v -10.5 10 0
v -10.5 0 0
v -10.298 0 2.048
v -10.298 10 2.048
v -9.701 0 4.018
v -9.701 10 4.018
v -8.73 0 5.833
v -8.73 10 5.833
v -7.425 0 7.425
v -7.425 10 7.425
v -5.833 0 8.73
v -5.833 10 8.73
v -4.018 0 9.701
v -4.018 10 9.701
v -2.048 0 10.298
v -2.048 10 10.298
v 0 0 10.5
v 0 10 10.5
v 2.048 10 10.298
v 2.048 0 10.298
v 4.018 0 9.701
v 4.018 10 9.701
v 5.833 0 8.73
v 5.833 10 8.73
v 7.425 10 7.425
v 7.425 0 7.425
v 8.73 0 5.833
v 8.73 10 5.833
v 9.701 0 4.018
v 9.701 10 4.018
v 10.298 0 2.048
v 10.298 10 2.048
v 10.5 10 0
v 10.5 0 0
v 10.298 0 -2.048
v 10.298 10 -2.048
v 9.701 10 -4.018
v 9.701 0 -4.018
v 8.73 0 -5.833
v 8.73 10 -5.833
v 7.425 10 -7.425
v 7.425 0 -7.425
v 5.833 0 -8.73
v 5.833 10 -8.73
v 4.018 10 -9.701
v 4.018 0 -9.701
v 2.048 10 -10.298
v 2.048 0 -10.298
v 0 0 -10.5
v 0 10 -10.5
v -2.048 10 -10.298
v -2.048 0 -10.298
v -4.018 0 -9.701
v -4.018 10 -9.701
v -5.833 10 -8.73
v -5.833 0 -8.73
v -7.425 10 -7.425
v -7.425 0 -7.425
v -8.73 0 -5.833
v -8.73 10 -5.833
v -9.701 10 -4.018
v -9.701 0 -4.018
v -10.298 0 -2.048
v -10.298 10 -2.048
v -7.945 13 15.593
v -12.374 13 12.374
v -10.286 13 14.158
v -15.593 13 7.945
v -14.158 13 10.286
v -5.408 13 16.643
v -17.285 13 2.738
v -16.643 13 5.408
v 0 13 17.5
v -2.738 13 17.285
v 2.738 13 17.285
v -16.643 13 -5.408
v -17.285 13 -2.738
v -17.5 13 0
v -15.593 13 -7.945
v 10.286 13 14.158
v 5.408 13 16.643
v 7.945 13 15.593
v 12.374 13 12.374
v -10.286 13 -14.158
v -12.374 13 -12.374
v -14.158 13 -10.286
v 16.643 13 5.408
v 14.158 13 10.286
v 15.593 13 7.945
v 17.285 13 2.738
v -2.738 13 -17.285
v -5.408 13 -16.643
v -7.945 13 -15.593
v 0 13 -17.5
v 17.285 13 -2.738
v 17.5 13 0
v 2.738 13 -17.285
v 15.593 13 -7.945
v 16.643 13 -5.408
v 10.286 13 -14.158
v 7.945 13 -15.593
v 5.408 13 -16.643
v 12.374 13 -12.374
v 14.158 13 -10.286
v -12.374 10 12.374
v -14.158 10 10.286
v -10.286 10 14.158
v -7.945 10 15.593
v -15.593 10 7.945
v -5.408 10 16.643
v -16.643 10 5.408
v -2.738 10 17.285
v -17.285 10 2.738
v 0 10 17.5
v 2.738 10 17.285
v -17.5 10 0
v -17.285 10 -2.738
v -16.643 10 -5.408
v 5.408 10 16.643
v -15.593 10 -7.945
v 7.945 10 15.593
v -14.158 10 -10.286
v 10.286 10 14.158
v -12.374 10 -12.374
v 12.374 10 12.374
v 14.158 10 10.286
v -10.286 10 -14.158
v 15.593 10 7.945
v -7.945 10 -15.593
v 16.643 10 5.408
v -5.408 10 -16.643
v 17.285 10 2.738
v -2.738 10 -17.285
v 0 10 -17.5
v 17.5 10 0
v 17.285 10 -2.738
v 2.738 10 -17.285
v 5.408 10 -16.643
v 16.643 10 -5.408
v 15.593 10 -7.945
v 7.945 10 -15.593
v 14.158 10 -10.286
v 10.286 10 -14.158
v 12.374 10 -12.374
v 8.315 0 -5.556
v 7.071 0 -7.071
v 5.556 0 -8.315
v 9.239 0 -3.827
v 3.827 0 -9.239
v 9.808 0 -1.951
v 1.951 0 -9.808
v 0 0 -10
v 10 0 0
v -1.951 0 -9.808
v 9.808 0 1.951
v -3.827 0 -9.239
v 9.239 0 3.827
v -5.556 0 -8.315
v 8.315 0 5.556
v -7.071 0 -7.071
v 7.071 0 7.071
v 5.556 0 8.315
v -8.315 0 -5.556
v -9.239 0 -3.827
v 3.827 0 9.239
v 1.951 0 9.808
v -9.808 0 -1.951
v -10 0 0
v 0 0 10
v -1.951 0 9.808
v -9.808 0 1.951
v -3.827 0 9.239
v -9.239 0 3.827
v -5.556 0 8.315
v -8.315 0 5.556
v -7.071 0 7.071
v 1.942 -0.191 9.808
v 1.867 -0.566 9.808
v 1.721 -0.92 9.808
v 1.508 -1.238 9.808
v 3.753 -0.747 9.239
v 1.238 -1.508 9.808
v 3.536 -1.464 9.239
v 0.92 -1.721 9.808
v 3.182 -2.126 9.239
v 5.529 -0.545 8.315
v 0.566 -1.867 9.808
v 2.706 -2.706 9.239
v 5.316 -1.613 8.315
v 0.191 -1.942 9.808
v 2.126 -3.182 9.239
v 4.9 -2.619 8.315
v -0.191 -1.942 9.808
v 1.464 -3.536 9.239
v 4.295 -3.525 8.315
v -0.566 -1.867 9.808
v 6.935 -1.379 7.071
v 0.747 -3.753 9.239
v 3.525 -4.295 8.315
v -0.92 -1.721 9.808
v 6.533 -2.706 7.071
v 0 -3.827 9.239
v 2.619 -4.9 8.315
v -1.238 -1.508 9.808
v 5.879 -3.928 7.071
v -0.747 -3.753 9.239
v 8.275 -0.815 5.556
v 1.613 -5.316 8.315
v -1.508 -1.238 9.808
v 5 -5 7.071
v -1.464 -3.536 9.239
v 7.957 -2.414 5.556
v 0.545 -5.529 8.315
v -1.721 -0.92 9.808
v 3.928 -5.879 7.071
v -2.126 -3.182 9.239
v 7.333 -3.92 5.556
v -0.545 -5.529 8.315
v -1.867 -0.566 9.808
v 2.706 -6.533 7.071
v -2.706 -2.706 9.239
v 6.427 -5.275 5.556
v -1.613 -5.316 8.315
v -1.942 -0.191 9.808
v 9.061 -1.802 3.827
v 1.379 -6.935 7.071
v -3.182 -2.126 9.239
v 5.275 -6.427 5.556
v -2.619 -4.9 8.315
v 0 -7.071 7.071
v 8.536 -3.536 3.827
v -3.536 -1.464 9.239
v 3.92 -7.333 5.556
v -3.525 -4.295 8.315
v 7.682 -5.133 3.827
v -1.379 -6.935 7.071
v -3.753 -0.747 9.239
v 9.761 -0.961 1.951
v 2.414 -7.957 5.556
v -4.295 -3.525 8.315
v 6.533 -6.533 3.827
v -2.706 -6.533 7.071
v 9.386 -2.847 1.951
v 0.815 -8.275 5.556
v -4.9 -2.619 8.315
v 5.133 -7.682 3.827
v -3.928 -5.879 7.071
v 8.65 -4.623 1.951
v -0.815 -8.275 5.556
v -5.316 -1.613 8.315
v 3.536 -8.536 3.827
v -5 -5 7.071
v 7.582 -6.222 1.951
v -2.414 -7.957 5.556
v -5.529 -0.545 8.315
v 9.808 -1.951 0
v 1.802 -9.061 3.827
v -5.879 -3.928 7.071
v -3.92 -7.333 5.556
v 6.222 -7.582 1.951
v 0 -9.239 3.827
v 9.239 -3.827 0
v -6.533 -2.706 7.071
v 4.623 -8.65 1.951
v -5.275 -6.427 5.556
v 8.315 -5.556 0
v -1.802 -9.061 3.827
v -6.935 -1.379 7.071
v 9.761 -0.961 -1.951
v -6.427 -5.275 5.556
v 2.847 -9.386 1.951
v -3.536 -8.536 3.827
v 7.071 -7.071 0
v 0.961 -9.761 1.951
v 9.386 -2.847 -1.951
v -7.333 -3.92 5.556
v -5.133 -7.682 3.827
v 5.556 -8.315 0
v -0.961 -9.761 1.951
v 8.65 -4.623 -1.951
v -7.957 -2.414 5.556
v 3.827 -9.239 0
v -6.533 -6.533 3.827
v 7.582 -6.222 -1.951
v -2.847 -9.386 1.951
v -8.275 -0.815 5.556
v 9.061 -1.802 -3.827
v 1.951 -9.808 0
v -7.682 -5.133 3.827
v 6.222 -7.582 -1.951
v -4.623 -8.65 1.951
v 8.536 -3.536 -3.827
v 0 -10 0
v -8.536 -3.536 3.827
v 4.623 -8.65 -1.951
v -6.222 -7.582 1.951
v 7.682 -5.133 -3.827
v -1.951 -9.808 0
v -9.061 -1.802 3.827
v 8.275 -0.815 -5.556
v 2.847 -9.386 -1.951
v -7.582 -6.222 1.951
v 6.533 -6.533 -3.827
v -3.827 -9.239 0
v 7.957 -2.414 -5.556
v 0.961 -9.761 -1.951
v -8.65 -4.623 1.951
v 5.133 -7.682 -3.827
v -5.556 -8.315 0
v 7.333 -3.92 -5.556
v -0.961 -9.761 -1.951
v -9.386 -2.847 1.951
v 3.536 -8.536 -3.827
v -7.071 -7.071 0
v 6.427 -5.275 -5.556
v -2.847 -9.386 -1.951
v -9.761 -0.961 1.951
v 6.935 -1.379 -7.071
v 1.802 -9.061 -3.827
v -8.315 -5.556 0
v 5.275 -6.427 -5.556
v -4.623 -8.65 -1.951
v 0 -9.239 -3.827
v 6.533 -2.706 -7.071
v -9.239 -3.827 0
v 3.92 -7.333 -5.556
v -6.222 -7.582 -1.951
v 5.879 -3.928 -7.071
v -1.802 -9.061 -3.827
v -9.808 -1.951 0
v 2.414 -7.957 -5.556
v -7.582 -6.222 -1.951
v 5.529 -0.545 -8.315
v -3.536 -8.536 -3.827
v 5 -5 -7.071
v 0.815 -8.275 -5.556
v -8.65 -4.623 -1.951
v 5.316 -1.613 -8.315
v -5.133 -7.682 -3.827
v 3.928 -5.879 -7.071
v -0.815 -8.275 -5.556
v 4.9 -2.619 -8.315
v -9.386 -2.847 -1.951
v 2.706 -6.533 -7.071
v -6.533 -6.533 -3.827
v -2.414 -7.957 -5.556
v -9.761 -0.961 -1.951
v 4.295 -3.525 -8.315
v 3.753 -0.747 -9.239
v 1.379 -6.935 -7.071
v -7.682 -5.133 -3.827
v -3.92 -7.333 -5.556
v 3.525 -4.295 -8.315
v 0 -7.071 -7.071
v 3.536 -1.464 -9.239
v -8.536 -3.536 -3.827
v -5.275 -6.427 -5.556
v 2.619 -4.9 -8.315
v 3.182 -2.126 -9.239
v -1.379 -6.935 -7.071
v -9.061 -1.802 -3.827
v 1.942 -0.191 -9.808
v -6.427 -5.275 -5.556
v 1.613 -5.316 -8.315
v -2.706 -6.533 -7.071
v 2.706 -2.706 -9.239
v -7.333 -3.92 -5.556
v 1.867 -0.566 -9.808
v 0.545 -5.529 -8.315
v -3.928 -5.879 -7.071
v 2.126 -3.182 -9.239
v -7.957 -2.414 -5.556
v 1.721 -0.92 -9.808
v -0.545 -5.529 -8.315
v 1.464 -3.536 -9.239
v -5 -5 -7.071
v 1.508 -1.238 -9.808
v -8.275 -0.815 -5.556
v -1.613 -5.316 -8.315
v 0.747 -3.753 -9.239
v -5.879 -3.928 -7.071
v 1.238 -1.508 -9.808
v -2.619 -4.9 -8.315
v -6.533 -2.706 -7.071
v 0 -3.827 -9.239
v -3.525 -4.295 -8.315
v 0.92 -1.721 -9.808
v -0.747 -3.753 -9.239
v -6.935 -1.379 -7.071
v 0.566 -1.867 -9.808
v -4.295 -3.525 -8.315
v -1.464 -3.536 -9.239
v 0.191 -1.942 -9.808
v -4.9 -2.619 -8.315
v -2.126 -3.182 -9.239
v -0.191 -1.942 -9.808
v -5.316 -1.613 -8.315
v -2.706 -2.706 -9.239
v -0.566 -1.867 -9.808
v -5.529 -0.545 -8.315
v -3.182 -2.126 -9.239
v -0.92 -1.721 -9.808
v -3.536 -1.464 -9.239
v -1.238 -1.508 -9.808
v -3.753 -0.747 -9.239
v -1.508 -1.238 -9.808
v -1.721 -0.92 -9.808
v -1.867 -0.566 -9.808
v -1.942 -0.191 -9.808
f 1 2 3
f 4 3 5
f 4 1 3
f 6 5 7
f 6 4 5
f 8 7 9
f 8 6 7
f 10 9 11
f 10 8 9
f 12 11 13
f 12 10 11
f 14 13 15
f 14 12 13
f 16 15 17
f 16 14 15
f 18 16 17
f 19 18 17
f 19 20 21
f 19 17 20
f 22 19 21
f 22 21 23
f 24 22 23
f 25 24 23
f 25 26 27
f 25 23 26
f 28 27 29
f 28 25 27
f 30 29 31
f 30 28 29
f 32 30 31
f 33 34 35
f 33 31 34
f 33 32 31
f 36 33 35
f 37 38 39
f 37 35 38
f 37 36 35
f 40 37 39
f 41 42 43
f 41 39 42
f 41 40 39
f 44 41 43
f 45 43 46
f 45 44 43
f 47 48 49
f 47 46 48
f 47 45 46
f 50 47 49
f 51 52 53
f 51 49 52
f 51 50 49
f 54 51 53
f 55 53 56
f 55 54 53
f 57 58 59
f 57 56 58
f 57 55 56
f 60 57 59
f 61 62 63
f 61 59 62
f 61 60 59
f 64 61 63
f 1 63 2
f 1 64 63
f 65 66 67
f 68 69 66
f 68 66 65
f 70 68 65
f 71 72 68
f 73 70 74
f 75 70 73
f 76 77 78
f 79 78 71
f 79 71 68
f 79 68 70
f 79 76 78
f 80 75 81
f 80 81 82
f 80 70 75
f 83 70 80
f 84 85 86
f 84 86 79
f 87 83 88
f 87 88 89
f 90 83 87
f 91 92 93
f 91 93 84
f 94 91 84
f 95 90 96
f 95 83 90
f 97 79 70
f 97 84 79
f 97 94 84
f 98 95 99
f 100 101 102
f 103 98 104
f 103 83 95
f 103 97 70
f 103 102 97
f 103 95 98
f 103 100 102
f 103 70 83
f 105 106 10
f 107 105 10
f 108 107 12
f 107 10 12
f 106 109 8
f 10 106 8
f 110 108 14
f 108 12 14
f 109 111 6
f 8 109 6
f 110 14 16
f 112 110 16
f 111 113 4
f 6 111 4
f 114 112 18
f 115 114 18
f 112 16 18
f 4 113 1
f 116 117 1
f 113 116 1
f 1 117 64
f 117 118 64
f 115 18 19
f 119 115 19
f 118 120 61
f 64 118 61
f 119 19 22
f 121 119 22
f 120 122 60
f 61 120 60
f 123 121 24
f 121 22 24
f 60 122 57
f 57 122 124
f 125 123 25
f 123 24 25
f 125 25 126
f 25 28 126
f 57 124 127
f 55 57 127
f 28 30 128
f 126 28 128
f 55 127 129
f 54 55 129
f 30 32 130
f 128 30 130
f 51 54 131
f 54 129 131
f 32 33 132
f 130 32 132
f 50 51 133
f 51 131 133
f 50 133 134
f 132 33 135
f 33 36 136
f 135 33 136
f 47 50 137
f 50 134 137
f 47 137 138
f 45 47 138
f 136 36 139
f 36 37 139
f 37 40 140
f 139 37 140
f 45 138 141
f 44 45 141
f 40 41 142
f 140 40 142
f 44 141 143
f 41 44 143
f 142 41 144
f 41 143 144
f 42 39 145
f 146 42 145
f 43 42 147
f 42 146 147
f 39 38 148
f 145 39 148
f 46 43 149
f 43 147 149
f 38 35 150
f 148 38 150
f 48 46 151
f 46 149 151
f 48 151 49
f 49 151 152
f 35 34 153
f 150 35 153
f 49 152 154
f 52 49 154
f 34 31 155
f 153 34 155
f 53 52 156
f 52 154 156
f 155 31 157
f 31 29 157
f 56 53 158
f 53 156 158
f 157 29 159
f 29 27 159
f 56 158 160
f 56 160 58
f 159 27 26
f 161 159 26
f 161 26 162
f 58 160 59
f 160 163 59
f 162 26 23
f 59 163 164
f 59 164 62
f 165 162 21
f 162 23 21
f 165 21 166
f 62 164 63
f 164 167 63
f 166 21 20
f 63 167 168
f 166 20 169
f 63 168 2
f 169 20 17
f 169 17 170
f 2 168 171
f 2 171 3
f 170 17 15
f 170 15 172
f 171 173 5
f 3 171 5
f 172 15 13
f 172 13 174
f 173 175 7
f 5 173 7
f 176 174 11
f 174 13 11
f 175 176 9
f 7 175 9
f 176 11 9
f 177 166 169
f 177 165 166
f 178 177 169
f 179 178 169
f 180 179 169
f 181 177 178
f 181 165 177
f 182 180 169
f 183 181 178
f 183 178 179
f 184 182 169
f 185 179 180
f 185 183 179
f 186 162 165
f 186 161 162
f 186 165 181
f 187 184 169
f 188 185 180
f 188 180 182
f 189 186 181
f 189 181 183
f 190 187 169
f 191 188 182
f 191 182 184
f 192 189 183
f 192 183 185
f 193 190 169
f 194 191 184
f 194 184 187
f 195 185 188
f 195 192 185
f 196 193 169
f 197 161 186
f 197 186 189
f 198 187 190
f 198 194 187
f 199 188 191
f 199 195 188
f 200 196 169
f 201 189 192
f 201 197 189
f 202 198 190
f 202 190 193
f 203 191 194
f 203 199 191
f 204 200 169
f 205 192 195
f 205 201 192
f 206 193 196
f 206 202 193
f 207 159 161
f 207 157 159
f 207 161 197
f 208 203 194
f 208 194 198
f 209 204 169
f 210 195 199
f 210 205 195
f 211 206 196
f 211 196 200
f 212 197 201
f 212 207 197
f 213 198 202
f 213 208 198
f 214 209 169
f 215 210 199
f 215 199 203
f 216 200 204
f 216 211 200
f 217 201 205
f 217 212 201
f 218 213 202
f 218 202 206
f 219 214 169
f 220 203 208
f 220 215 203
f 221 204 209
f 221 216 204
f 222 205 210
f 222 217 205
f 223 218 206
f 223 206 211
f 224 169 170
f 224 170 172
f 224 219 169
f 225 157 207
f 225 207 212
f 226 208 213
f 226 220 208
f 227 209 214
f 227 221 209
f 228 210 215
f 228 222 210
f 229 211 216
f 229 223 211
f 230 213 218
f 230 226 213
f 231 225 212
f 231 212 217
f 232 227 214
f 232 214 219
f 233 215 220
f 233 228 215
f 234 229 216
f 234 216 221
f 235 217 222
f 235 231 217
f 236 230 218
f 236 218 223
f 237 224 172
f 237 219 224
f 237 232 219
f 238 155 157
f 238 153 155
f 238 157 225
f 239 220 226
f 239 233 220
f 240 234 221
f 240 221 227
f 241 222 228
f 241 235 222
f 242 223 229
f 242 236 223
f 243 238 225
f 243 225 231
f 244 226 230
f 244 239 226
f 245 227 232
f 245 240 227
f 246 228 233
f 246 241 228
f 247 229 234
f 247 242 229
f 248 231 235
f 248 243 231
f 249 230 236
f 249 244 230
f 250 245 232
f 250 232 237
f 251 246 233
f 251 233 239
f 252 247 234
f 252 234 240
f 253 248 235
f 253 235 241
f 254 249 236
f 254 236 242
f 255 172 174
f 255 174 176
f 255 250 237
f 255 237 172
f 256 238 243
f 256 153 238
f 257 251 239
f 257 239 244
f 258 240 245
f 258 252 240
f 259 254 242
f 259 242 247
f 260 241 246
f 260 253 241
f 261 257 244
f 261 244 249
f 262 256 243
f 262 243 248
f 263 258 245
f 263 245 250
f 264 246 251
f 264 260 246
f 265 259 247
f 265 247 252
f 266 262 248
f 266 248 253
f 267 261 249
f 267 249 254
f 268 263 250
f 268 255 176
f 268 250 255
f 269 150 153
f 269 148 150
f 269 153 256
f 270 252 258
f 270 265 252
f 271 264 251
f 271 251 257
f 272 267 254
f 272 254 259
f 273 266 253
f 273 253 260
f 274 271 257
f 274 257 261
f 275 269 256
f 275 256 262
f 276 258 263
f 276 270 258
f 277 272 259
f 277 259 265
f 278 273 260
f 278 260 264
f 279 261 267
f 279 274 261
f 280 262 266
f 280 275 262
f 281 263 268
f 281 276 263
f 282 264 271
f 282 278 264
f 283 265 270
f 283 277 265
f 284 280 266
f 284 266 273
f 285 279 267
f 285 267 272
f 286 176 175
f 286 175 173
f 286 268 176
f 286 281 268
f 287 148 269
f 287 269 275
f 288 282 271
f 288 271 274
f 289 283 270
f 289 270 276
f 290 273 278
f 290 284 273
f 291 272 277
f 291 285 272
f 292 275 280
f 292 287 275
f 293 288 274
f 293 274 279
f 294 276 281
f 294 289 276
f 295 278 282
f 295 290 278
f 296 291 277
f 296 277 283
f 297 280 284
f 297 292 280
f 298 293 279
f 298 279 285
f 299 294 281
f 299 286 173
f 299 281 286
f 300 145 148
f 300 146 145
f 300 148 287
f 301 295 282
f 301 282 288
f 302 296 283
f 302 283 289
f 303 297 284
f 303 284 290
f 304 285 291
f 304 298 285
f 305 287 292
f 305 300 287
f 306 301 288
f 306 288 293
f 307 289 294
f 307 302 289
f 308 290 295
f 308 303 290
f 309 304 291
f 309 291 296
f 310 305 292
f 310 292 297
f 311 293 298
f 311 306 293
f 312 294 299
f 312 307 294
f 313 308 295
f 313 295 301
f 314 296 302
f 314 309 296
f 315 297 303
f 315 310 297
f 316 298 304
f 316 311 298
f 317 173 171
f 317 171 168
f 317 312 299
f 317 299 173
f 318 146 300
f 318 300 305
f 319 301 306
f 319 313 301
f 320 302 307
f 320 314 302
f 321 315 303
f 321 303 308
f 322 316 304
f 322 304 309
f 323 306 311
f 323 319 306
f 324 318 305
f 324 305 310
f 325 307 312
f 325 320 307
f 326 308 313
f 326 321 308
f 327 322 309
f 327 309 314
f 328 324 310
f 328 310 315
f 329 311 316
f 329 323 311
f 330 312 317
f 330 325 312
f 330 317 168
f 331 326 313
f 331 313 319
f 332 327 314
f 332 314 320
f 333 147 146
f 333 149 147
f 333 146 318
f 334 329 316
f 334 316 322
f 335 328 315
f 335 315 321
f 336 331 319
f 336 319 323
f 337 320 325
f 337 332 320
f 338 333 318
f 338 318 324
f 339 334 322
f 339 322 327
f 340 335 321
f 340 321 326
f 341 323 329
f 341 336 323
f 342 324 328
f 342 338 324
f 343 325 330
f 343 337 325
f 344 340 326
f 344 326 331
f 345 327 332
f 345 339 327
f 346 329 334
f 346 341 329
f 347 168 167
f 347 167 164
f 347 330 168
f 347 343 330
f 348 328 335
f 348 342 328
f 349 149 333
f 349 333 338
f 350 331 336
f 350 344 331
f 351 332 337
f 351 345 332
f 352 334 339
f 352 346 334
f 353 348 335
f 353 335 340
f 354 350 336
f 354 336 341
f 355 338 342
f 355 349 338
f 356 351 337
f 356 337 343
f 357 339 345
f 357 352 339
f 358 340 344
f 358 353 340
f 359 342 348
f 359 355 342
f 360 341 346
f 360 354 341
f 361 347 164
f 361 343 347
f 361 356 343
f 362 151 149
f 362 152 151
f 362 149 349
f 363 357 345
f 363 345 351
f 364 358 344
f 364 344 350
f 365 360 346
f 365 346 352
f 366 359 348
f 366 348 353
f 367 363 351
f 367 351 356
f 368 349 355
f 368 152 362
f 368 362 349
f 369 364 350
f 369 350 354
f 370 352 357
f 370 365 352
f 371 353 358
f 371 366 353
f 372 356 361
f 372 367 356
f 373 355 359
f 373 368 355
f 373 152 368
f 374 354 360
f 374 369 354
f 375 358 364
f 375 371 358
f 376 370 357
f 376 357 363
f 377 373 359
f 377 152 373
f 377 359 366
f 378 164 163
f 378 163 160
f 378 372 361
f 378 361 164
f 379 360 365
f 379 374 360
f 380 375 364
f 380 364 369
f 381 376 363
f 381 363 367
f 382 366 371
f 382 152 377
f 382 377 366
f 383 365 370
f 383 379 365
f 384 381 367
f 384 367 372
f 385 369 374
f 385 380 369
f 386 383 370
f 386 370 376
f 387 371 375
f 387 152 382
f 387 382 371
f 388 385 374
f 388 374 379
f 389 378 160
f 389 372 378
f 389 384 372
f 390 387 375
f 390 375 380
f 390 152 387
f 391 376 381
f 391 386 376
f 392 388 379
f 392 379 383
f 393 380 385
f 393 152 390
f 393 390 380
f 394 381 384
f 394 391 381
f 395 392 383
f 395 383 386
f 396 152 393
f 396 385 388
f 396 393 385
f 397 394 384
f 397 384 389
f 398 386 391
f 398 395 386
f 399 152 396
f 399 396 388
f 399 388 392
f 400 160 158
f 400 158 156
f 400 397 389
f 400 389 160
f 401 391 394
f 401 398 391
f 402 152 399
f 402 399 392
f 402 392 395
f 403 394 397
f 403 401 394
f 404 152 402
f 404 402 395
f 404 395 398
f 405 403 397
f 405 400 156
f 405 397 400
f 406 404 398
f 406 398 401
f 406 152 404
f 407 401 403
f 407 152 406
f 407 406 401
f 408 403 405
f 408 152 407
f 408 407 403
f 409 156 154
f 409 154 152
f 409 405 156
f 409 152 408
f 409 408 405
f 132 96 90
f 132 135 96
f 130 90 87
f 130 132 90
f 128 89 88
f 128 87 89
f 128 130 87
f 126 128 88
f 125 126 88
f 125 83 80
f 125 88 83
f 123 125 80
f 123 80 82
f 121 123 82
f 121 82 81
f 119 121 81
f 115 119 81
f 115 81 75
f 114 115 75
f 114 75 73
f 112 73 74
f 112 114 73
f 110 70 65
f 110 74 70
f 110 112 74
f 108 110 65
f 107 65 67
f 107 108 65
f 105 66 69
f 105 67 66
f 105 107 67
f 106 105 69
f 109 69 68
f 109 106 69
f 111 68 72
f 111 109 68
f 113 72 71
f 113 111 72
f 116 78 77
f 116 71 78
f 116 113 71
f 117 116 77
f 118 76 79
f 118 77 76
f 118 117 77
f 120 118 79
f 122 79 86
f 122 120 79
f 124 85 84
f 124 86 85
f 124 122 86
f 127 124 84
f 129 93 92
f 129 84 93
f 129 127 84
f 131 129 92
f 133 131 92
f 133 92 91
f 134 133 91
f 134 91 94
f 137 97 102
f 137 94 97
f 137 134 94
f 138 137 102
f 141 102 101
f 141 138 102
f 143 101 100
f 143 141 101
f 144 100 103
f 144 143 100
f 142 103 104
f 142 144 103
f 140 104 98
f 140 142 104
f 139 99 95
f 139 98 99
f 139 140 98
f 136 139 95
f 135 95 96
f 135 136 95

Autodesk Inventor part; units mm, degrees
ref_plane "YZ Plane" through (0, 0, 0) normal (1, 0, 0) x (0, 1, 0)
ref_plane "XY Plane" through (0, 0, 0) normal (0, 0, 1) x (1, 0, 0)
sketch "Sketch1" plane through (0, 0, 0) normal (0, 1, 0) x (-1, 0, 0)
  arc A0 (0, 10) -> (0, -10) centre (0, 0) ccw
  line L0 (0, 10) -> (0, -10)
  dimension "d0" = 20
revolve "Revolution1" add sketch "Sketch1" angle 360 about axis through (0, 0, 10) along (0, 0, -1)
ref_plane "Work Plane1" through (0, 10, 0) normal (0, 1, 0) x (-1, 0, 0)
sketch "Sketch2" plane through (0, 10, 0) normal (0, 1, 0) x (-1, 0, 0)
  circle A0 centre (0, 0) radius 10.5
  dimension "d2" = 21
sketch "Sketch3" plane through (0, 0, 0) normal (0, 1, 0) x (-1, 0, 0)
  arc A0 (0, 10.5) -> (0, -10.5) centre (0, 0) ccw
  line L0 (0, 10.5) -> (0, -10.5)
  dimension "d3" = 21
revolve "Revolution2" add sketch "Sketch3" angle 180 about axis through (0, 0, 10.5) along (0, 0, 1)
extrude "Extrusion1" add sketch "Sketch2" against normal up to next
sketch "Sketch4" plane through (0, 10, 0) normal (0, 1, 0) x (1, 0, 0)
  circle A0 centre (0, 0) radius 3.2016 projected
  circle A1 centre (0, 0) radius 17.5
  dimension "d7" = 35
extrude "Extrusion2" add sketch "Sketch4" along normal blind 3 contours A0 | A1
properties part number "chasis wheel"
